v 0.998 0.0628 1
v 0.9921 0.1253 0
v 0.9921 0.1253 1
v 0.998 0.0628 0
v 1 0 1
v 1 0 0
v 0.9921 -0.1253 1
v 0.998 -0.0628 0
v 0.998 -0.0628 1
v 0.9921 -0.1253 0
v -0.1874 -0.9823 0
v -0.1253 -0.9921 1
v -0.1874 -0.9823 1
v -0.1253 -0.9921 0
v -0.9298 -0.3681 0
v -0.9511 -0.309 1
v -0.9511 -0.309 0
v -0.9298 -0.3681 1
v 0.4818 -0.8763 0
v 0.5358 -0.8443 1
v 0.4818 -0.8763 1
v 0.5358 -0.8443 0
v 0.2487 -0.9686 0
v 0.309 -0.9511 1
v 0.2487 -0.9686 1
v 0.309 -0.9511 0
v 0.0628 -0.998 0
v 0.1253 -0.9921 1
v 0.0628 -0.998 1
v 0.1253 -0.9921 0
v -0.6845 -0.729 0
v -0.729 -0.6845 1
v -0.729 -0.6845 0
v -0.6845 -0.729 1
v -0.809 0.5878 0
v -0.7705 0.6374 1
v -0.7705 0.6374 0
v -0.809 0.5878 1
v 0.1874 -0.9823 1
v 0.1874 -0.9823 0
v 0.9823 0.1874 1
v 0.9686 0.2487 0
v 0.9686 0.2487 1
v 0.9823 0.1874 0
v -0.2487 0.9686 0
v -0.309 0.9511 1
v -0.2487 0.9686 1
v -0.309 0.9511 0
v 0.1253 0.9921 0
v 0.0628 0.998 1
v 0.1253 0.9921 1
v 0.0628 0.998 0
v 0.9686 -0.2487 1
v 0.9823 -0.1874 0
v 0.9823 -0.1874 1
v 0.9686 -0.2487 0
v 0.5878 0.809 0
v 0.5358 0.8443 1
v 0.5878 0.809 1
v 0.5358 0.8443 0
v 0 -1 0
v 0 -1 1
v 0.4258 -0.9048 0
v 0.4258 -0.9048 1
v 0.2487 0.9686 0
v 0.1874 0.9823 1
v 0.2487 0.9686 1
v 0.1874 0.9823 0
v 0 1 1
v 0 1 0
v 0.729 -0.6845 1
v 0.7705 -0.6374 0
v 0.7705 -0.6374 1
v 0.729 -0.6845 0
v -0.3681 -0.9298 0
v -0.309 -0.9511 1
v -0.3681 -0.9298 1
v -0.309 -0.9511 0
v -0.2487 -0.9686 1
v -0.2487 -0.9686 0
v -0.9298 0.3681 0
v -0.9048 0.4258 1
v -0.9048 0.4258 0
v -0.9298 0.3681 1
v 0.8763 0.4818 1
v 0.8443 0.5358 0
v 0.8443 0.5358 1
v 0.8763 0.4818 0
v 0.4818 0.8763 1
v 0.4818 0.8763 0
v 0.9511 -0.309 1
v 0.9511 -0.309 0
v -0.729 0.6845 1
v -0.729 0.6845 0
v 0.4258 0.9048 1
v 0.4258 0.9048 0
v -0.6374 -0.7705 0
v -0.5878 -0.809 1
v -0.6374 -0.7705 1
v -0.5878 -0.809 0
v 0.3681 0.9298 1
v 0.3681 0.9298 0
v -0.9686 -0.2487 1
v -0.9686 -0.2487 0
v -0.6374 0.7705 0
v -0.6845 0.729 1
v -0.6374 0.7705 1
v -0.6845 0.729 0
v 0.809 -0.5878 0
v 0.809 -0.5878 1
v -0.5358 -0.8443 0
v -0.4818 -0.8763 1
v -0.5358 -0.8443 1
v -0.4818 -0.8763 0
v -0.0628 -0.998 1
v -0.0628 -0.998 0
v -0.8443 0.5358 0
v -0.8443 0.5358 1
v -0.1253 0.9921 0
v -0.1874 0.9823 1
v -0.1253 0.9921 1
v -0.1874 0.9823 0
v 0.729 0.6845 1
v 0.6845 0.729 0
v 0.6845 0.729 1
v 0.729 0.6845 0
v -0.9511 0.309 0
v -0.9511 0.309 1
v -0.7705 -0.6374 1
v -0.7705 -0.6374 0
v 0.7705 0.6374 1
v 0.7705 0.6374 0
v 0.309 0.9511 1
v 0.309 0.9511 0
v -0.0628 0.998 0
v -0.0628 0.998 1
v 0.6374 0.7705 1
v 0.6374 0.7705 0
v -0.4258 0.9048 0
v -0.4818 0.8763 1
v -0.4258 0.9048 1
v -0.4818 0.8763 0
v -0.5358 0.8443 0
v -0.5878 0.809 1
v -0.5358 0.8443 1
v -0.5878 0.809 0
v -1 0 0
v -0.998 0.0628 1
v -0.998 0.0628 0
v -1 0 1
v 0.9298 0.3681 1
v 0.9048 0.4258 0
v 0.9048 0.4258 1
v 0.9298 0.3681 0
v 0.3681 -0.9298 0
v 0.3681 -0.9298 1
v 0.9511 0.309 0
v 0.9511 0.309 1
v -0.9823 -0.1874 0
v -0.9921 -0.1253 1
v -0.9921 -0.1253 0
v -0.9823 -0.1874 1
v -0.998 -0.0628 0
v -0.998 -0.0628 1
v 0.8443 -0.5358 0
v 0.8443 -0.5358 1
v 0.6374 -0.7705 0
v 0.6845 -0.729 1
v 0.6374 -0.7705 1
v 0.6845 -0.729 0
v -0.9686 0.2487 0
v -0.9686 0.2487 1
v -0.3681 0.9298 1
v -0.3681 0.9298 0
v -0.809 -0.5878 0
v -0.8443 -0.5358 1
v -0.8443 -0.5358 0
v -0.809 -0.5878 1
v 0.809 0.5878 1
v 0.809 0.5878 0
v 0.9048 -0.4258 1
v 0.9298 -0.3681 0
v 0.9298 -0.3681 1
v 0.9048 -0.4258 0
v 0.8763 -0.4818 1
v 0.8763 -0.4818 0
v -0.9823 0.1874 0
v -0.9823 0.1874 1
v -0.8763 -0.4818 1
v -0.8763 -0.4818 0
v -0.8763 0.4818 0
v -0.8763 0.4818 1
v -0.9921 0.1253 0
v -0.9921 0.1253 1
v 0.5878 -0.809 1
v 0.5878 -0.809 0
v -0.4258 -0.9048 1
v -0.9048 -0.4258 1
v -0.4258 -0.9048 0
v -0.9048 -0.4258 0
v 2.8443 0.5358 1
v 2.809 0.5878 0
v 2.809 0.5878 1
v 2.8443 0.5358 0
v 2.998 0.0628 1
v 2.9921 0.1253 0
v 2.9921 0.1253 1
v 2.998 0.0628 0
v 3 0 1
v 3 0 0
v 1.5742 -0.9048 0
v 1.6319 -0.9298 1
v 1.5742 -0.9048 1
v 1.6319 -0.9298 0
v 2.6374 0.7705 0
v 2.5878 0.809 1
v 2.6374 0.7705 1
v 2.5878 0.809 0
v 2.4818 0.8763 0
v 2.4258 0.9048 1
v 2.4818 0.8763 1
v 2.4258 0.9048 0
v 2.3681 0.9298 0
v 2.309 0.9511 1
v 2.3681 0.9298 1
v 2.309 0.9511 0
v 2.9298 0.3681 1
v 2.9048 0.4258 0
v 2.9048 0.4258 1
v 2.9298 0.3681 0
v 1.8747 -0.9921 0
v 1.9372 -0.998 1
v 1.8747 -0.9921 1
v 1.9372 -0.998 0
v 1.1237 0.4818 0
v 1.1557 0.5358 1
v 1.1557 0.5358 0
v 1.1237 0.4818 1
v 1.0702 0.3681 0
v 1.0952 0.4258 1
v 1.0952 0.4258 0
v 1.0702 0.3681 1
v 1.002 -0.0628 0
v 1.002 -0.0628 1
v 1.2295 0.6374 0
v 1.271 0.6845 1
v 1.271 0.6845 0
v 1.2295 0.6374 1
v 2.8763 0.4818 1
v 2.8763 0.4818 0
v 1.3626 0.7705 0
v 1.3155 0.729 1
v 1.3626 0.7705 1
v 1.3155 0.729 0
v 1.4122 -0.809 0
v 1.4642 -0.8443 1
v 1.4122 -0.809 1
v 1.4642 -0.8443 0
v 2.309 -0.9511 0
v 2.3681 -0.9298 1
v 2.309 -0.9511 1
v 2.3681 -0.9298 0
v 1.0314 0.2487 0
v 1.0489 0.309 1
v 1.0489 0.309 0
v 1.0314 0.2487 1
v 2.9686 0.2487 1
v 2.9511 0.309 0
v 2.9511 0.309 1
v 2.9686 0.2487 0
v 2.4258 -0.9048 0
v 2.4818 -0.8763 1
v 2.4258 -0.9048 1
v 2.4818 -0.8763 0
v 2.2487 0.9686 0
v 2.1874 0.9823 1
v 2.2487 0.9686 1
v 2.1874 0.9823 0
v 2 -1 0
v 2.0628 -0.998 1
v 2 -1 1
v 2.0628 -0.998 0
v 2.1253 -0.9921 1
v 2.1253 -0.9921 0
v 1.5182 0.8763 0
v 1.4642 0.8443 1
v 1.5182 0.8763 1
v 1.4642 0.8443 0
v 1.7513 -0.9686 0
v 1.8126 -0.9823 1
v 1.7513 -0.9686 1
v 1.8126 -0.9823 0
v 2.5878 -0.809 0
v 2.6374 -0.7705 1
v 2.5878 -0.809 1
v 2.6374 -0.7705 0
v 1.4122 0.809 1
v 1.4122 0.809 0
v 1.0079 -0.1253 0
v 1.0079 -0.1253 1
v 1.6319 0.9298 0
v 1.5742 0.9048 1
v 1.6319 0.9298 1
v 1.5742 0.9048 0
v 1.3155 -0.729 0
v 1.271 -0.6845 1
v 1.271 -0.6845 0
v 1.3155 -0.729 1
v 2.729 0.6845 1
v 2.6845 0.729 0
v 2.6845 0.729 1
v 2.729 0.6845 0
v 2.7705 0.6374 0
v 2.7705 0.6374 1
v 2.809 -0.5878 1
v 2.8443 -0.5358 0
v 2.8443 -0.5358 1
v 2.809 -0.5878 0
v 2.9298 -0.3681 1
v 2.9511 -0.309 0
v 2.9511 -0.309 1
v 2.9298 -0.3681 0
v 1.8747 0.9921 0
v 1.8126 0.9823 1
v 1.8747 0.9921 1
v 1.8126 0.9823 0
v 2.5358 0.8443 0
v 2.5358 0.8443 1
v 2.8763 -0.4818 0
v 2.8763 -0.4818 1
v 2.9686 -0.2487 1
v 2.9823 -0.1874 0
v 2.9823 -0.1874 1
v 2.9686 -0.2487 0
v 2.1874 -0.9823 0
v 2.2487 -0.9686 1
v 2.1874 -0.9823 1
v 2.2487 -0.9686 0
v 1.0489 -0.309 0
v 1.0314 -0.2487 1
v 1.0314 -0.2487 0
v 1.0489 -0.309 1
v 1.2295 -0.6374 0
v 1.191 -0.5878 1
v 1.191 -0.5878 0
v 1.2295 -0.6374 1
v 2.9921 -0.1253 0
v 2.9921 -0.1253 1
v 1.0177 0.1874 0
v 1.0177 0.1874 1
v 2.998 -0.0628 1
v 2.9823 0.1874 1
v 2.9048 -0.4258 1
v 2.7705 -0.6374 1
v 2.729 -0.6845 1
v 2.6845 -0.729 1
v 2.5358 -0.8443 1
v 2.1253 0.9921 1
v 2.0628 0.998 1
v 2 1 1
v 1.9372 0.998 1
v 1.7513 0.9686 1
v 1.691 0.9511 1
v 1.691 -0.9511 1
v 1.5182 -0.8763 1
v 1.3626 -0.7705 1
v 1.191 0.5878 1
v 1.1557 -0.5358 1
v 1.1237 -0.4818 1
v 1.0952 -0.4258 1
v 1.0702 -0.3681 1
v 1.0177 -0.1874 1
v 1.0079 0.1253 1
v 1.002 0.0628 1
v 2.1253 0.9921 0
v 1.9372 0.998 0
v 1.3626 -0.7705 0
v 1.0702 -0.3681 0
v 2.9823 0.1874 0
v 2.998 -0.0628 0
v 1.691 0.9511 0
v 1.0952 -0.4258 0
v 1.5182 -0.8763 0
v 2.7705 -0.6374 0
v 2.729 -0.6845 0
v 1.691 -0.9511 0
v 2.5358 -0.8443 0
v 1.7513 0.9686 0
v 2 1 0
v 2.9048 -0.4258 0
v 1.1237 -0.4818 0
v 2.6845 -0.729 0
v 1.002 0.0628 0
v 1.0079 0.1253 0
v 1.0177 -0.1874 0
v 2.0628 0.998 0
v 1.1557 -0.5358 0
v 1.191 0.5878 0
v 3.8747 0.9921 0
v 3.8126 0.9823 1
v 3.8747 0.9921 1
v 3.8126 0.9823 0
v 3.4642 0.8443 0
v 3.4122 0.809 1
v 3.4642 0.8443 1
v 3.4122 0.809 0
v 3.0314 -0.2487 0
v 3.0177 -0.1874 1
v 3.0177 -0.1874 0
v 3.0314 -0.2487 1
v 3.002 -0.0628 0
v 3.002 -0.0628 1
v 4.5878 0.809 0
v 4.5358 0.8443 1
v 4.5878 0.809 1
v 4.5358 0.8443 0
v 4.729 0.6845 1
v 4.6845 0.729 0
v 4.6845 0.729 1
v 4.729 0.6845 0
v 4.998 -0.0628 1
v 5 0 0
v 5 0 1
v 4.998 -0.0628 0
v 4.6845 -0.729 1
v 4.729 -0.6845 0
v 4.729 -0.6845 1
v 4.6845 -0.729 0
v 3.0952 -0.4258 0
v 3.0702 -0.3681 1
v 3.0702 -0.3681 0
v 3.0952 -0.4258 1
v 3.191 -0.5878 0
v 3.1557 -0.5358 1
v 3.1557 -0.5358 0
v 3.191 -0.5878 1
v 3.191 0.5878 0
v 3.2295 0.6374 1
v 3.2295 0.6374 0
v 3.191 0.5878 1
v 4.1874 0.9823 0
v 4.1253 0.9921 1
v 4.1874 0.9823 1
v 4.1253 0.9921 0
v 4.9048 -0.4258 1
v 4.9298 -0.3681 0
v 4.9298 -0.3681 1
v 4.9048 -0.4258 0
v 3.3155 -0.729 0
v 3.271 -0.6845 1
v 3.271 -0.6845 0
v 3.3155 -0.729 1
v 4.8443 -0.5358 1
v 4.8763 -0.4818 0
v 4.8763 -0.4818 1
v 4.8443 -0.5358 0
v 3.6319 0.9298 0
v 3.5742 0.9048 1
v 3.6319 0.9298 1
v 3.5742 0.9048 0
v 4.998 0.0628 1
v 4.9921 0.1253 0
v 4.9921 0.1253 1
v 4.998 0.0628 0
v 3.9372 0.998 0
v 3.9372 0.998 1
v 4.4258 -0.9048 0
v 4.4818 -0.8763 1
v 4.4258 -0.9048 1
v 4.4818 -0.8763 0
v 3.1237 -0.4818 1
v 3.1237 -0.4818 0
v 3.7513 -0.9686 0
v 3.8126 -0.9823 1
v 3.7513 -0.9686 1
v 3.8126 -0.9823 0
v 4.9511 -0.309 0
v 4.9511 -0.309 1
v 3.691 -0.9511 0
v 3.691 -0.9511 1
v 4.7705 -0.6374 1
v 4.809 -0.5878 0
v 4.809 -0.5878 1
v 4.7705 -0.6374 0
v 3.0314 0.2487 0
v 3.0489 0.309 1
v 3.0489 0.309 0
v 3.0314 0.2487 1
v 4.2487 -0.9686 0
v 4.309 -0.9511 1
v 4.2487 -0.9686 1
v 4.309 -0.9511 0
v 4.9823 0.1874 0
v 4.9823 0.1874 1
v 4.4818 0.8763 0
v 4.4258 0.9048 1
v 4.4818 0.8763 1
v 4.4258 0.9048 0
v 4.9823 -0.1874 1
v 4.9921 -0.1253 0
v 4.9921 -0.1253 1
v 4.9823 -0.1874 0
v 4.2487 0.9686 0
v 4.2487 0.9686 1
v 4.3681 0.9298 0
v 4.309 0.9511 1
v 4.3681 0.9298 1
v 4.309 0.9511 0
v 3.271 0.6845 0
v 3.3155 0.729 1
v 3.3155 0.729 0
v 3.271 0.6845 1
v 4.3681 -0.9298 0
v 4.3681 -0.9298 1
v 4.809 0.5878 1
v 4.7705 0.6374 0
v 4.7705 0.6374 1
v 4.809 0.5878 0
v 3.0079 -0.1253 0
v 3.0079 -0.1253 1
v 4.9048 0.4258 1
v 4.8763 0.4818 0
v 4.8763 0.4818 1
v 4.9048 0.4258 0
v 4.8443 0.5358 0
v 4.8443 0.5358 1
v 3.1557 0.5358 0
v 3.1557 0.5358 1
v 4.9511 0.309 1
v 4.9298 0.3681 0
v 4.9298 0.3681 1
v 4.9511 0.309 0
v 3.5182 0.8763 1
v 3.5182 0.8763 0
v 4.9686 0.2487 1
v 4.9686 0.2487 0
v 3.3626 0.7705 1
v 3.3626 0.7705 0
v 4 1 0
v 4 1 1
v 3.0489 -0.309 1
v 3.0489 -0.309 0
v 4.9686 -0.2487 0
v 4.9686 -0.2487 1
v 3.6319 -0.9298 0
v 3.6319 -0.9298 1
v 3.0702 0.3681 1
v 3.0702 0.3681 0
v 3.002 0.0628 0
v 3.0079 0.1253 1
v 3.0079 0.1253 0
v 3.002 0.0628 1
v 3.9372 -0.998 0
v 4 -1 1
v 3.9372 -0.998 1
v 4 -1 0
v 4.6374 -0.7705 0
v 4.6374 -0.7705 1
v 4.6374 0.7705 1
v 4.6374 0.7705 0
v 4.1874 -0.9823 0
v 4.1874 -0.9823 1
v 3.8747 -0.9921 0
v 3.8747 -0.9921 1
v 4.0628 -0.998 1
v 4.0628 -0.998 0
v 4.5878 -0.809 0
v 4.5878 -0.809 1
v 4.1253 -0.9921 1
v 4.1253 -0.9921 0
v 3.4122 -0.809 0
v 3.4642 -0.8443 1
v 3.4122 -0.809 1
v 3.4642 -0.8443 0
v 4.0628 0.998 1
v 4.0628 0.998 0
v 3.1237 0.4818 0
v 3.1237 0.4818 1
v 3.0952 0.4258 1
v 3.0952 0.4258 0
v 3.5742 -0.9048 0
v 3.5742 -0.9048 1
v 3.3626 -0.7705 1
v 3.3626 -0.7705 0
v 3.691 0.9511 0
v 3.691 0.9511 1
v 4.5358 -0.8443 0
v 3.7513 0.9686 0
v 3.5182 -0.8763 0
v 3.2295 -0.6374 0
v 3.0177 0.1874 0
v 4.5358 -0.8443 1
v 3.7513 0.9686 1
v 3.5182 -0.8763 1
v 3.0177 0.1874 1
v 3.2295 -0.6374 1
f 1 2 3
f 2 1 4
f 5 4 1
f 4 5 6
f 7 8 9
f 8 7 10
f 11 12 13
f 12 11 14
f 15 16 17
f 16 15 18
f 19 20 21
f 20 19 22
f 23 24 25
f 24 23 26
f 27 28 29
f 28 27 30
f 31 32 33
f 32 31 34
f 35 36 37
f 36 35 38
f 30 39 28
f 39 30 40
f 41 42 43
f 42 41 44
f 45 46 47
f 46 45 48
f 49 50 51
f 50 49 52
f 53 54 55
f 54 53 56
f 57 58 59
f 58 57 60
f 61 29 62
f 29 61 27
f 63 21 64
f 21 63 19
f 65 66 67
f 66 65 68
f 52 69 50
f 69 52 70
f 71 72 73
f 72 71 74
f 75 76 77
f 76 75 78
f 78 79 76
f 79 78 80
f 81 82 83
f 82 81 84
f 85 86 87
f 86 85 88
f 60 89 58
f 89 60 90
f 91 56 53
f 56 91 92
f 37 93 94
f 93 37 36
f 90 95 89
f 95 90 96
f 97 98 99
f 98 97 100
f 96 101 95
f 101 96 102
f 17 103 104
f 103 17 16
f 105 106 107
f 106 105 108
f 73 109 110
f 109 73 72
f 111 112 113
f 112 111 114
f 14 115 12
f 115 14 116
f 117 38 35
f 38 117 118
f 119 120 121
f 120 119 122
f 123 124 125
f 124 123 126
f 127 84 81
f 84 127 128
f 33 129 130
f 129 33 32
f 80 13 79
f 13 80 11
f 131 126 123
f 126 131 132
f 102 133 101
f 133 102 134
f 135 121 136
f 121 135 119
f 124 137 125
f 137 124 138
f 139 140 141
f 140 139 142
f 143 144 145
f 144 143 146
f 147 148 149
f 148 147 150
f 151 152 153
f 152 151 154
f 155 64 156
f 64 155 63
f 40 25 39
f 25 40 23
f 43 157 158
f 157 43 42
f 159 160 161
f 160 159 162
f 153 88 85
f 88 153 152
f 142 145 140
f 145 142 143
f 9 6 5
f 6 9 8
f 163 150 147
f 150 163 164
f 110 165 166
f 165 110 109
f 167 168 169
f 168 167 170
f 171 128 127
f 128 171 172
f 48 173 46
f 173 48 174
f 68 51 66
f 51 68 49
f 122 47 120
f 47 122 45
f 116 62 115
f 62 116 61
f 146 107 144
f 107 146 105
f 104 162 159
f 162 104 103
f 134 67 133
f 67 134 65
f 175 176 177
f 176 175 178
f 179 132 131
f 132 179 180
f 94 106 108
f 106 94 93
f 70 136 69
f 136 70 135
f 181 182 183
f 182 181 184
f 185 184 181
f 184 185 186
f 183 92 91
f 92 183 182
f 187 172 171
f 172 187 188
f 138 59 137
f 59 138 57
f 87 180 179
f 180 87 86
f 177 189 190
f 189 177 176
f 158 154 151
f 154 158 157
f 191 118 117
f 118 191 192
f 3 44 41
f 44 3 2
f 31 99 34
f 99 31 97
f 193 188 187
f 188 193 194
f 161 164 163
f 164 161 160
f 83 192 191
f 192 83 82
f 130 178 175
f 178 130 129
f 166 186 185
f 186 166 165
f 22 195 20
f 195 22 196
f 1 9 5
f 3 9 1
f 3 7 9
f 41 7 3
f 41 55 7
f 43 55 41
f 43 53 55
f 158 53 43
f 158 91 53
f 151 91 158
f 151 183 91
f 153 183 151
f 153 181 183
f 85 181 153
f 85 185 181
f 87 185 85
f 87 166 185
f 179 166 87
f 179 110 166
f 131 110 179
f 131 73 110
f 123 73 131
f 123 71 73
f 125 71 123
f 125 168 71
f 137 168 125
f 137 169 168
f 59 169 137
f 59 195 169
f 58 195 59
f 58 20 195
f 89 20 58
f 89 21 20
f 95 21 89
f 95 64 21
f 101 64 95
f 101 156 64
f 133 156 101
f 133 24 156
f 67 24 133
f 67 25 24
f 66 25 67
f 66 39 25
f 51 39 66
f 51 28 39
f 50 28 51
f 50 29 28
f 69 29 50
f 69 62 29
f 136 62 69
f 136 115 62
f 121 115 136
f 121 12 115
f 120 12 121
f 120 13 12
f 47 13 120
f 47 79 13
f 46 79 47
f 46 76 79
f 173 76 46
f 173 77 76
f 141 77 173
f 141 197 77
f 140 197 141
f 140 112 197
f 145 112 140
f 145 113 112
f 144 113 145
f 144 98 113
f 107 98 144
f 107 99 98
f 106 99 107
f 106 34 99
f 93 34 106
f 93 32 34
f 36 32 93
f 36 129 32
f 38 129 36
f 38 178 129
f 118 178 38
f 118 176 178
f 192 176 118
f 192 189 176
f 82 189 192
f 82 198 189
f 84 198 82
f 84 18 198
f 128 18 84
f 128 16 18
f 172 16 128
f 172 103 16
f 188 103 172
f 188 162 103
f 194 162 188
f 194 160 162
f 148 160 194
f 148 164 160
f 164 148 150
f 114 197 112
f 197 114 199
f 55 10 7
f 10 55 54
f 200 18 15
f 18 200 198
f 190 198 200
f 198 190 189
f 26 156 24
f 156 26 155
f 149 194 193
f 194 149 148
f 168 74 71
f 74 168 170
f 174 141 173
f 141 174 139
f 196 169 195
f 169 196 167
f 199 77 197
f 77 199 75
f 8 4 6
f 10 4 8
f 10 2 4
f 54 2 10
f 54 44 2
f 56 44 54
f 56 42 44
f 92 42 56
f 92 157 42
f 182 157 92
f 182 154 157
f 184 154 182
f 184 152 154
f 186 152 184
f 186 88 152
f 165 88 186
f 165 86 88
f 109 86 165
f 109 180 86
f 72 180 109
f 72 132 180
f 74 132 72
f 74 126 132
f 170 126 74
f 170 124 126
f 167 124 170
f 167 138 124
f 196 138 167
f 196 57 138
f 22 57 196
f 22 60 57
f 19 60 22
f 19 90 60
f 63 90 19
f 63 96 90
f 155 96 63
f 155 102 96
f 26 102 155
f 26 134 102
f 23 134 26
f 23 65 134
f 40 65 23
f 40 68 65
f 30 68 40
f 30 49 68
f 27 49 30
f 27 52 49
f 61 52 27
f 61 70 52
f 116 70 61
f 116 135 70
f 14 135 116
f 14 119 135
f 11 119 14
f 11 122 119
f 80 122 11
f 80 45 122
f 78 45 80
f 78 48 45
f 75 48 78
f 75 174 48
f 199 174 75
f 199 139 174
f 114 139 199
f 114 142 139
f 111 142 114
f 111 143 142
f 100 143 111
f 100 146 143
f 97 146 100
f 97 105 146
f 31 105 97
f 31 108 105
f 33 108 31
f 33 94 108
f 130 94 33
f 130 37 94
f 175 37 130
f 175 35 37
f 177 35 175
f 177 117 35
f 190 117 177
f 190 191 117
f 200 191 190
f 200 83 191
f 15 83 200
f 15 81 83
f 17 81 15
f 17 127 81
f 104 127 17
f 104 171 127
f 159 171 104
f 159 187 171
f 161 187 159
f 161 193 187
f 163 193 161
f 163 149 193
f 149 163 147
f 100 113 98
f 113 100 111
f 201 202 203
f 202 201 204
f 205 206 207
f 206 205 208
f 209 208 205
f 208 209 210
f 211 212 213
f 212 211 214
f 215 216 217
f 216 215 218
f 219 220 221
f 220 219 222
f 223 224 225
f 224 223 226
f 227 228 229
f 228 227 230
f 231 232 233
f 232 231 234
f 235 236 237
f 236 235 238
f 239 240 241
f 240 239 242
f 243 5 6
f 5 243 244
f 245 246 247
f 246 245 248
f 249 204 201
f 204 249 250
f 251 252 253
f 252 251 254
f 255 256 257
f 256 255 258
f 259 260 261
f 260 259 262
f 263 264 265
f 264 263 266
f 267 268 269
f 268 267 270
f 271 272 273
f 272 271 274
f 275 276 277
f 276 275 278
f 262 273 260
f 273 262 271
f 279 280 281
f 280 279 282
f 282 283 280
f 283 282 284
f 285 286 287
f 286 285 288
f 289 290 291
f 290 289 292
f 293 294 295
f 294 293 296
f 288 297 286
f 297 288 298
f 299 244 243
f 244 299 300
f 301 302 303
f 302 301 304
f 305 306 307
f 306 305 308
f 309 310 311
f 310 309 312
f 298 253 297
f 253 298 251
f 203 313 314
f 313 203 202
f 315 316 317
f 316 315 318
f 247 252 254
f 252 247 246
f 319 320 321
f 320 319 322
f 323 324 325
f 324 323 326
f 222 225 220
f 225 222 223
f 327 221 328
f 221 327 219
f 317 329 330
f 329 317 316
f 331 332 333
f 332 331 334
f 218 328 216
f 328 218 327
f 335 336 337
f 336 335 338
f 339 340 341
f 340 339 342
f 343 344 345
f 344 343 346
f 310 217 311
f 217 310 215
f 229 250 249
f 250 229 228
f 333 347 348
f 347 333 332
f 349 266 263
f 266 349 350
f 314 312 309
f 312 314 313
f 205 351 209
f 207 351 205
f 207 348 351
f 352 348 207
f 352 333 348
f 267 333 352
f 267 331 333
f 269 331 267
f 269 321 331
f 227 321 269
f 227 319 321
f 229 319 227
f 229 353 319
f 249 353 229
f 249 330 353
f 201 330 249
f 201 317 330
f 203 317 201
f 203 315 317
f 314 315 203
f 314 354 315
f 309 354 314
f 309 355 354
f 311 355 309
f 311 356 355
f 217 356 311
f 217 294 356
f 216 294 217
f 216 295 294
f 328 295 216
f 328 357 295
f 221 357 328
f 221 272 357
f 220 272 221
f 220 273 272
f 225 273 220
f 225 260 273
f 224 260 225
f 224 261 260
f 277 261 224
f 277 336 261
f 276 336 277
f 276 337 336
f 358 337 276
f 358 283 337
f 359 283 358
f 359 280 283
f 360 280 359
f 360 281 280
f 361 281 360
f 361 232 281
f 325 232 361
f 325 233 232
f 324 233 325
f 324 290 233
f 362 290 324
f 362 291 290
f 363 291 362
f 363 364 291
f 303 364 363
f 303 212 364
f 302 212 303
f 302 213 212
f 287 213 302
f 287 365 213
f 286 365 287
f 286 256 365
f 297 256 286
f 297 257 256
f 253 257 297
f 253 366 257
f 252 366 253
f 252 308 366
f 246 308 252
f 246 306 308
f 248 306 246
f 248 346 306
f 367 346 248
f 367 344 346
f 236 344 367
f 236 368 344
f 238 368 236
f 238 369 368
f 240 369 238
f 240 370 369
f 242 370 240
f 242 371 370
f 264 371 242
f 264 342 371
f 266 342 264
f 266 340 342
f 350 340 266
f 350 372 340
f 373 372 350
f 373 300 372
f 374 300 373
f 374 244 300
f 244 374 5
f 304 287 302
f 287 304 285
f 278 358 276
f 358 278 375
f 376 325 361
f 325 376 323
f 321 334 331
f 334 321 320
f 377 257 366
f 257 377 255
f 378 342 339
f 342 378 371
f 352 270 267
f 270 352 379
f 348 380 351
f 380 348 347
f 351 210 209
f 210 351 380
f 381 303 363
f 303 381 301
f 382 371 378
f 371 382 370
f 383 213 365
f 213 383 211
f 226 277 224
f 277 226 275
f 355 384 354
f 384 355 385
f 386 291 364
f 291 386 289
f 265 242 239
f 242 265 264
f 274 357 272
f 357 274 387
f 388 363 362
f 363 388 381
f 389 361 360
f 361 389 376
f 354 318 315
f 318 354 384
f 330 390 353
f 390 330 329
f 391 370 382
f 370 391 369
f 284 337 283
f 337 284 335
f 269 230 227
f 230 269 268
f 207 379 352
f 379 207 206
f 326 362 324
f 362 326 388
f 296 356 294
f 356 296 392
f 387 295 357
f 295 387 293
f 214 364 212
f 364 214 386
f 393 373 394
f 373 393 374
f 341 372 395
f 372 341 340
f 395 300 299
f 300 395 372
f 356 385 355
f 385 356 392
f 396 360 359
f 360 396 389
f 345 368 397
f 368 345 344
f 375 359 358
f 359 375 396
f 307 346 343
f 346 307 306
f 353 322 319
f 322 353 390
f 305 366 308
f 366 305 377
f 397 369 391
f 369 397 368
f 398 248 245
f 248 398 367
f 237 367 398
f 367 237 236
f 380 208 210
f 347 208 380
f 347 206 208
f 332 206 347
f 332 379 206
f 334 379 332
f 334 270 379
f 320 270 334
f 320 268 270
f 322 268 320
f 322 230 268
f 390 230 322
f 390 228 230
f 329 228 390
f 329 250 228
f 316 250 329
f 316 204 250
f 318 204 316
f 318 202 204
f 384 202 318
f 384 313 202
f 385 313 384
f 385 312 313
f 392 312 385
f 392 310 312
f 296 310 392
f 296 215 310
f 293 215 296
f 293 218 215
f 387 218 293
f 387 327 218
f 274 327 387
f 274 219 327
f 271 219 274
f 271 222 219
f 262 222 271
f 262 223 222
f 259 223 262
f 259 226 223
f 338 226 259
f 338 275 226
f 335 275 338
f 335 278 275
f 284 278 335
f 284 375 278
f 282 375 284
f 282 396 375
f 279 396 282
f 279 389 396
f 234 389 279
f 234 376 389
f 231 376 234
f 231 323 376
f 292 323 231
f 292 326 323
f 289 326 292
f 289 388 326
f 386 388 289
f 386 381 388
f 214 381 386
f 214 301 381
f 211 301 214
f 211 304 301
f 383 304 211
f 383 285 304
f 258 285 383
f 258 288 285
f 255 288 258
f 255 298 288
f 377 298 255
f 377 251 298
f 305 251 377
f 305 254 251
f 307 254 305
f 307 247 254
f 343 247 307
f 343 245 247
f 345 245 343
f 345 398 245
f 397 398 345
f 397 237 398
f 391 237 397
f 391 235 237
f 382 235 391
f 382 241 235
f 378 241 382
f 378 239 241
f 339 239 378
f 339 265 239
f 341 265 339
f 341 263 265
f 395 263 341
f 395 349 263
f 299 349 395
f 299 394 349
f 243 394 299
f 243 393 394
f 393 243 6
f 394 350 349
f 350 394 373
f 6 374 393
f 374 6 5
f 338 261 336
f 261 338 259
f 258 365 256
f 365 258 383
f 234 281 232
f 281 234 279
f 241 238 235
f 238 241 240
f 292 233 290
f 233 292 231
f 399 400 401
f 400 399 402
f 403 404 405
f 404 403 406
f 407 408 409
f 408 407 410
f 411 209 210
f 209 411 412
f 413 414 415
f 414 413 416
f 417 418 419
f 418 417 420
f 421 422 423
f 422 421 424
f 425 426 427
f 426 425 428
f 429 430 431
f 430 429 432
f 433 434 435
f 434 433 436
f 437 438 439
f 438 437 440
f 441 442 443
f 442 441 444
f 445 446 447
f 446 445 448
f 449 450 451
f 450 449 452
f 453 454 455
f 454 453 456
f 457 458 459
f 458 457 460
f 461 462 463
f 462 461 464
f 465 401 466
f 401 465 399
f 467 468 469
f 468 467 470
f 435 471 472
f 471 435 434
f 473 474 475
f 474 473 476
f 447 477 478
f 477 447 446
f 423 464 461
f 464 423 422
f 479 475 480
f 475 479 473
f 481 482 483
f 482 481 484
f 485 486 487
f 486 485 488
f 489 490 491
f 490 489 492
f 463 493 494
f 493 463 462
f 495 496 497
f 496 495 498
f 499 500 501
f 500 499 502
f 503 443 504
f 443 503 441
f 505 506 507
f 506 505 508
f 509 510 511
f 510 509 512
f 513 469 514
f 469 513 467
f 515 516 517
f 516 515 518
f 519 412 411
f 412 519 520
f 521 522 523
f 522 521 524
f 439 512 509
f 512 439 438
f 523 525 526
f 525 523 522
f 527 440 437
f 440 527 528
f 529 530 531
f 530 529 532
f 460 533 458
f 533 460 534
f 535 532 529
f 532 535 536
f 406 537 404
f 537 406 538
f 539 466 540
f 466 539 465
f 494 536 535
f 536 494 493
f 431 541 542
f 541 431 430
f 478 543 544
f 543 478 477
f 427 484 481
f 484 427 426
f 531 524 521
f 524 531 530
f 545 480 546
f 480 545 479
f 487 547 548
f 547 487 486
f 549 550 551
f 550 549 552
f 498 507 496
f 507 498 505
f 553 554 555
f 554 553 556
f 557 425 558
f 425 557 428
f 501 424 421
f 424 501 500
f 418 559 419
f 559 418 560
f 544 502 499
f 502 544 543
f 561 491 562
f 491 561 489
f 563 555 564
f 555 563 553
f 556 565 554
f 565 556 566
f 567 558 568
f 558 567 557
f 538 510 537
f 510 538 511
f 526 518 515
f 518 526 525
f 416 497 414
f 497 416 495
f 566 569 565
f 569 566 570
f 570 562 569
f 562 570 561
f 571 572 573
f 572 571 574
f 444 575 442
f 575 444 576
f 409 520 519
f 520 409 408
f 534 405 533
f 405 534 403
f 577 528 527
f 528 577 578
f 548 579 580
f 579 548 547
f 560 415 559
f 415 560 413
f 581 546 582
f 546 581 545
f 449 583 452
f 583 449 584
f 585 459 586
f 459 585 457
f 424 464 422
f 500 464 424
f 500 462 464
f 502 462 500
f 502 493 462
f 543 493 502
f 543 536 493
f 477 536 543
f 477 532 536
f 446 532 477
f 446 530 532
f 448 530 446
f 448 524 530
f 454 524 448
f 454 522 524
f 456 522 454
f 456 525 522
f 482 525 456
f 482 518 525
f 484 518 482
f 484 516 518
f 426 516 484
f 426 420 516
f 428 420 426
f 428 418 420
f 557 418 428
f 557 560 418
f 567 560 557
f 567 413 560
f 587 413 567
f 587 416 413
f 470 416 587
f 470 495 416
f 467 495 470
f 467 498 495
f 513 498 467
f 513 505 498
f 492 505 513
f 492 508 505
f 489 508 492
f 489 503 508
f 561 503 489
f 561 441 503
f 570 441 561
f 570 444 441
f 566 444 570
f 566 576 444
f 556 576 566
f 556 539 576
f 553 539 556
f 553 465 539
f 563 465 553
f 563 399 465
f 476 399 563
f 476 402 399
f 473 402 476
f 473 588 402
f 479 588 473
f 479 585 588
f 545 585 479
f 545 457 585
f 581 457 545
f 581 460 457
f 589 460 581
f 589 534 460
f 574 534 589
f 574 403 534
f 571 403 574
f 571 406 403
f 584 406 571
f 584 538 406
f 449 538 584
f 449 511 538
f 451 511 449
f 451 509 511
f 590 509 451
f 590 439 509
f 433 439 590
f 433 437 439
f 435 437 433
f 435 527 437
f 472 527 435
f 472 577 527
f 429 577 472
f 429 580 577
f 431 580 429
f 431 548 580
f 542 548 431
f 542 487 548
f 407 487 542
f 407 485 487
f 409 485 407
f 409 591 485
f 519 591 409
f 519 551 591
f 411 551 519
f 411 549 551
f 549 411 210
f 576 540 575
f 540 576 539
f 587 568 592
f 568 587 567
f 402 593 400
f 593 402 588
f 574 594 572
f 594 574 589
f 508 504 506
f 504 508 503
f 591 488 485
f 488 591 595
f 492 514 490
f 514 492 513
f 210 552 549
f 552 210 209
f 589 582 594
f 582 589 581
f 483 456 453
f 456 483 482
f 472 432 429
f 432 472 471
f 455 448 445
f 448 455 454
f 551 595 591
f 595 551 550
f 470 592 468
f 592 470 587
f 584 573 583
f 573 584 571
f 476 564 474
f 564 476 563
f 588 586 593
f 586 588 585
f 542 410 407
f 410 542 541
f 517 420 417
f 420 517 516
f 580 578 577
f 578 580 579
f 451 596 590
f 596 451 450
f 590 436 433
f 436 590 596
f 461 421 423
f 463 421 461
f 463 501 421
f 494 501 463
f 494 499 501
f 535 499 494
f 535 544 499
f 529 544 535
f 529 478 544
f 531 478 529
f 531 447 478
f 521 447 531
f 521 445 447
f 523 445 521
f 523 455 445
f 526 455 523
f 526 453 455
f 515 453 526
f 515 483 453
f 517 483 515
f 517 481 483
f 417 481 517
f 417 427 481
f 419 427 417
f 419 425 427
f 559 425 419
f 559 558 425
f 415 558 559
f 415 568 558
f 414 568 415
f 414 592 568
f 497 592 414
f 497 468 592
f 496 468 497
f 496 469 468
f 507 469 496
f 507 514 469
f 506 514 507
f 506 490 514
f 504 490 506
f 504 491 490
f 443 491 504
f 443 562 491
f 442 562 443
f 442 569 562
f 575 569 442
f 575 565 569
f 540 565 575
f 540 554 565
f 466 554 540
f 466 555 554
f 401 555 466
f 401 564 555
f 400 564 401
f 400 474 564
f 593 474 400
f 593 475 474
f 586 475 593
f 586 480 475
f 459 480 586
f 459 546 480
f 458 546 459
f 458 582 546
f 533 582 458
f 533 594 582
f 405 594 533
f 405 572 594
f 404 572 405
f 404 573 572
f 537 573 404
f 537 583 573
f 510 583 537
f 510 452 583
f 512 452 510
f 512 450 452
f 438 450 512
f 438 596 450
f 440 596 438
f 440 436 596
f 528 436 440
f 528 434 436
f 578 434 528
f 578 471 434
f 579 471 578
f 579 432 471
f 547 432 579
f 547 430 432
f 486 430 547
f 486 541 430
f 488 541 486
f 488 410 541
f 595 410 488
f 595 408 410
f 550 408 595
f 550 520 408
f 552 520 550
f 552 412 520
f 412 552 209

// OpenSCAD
$fn = 100;

cylinder();
translate([2, 0, 0]) cylinder();
#translate([4, 0, 0]) cylinder();
%translate([6, 0, 0]) cylinder();
*translate([8, 0, 0]) cylinder();

for (i = [1:3]);
